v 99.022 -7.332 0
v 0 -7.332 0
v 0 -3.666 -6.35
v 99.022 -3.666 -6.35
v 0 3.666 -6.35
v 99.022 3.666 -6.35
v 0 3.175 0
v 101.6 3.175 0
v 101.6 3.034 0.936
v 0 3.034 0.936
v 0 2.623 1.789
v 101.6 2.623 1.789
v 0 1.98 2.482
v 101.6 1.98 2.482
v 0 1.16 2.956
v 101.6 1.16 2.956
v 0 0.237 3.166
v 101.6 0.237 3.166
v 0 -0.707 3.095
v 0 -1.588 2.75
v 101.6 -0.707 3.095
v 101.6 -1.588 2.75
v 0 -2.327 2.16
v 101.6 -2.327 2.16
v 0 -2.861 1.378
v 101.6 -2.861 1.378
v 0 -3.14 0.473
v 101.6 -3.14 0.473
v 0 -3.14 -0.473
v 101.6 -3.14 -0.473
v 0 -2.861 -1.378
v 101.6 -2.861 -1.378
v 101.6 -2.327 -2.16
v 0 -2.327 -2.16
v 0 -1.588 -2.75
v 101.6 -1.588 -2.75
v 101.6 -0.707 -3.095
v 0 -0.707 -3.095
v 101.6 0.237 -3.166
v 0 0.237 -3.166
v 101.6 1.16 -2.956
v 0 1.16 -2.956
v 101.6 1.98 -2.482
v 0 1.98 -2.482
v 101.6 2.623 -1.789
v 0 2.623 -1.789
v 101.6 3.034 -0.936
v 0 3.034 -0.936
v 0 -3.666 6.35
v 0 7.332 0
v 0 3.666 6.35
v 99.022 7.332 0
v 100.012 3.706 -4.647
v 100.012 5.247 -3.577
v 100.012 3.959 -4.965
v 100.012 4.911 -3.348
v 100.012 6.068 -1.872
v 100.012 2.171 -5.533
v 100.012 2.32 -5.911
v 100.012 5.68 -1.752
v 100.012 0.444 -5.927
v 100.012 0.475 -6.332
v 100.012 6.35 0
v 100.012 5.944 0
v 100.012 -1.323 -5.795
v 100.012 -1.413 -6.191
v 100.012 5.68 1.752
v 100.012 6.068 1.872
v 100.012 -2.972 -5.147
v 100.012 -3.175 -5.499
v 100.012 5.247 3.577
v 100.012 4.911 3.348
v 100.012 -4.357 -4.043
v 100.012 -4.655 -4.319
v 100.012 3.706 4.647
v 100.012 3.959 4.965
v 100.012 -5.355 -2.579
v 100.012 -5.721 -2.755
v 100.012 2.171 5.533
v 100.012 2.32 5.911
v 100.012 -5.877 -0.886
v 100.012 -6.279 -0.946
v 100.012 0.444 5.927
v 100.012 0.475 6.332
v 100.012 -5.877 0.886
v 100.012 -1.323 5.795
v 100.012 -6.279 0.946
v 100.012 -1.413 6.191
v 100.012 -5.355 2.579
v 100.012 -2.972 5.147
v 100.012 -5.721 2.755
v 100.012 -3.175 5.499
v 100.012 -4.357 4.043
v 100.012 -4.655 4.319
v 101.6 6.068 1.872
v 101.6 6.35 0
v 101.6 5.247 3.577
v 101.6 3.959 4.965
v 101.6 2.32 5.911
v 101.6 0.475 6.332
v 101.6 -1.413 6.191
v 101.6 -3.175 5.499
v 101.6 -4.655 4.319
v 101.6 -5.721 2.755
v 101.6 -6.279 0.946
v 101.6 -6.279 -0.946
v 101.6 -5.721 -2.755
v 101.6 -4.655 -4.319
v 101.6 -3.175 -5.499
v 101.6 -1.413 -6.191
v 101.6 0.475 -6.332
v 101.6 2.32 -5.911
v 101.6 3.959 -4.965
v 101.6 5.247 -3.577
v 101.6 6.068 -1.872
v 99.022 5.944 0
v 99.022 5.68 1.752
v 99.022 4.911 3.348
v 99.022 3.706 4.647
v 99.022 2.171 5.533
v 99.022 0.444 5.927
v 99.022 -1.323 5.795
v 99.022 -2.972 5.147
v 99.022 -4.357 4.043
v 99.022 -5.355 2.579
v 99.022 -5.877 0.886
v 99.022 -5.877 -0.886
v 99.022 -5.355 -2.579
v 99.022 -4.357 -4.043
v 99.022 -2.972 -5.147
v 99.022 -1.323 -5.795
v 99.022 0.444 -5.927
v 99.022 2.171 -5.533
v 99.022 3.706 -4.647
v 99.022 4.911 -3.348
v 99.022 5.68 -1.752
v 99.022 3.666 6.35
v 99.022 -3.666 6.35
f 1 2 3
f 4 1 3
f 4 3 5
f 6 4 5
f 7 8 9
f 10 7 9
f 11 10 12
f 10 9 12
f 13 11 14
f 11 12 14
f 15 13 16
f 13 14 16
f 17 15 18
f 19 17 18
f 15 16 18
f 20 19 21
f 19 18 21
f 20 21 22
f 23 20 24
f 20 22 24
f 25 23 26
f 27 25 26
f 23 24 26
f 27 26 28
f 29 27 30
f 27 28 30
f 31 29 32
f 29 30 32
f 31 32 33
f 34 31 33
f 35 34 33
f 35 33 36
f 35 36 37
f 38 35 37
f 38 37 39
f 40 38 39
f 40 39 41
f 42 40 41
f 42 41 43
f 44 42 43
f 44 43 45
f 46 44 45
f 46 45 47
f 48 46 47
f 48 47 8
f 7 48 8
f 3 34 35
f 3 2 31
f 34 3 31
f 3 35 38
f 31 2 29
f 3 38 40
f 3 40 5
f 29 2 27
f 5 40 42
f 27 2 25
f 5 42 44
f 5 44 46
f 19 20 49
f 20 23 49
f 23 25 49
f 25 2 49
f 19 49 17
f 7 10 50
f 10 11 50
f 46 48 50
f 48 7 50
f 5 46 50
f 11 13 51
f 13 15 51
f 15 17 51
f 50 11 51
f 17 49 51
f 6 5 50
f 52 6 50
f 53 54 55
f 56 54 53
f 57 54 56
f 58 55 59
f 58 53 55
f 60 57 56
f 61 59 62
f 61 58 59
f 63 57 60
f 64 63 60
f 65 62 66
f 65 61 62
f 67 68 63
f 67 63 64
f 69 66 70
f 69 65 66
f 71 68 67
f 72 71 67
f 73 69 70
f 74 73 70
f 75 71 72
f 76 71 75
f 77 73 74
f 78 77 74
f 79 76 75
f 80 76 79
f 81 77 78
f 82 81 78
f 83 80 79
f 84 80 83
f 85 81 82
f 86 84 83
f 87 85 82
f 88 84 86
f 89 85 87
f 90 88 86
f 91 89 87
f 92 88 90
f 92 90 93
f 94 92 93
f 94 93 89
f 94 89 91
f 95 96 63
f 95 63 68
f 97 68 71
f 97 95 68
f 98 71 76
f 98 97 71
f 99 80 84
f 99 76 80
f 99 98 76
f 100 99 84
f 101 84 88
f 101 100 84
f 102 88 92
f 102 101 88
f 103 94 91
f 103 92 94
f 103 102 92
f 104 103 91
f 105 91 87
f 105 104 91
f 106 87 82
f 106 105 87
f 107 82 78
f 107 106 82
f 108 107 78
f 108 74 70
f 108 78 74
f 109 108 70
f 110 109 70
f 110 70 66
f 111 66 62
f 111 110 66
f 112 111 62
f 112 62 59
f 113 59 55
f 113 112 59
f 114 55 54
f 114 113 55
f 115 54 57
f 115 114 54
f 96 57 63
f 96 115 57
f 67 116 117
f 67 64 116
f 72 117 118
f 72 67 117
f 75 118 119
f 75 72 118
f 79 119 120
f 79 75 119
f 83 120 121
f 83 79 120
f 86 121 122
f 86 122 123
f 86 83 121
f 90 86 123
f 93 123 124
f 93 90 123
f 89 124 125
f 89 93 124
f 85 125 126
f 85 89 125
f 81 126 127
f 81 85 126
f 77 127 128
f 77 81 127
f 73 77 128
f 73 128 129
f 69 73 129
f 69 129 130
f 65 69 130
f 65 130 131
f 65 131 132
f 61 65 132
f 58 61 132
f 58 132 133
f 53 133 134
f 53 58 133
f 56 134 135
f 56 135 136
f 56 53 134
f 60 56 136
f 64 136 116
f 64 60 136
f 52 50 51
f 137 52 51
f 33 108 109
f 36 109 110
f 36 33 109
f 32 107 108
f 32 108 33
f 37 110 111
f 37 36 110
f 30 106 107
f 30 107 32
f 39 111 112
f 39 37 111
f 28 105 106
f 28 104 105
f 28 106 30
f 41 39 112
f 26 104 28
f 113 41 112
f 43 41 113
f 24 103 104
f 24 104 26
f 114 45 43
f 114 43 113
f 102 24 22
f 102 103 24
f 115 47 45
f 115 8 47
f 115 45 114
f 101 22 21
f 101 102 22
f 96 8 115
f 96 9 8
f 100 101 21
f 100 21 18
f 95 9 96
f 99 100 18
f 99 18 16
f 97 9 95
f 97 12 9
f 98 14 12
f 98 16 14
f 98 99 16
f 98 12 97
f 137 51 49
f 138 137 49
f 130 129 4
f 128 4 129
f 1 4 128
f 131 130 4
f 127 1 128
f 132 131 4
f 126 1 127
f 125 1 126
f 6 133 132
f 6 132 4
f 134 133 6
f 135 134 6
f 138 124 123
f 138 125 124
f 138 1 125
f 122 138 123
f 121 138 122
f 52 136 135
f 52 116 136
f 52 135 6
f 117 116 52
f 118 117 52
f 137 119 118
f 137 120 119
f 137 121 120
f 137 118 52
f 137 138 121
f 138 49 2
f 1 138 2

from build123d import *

# Parameters (mm, degrees)
F1_DEPTH = 101.6
F4_R     = 3.175
F5_DEPTH = 101.601


with BuildPart() as f1:
    # F0 (on Right) → F1 (new body)
    with BuildSketch(Plane.YZ):
        Polygon((3.6661742094, 6.35), (-3.6661742094, 6.35), (-7.3323484187, 0), (-3.6661742094, -6.35), (3.6661742094, -6.35), (7.3323484187, 0), align=None)
    extrude(amount=F1_DEPTH)

    # F2 (on Top) → F3 (revolve, cut)
    with BuildSketch(Plane.XY):
        Polygon((100.0125, 6.35), (101.6, 6.35), (101.6, 7.3323484187), (99.0219, 7.3323484187), (99.0219, 5.9436), (100.0125, 5.9436), align=None)
    revolve(axis=Axis((50.8, 0, 0), (1, 0, 0)), mode=Mode.SUBTRACT)

    # F4 (on face) → F5 (cut, through all)
    with BuildSketch(Plane.YZ.offset(101.6)):
        Circle(F4_R)
    extrude(amount=-F5_DEPTH, mode=Mode.SUBTRACT)


solid = f1.part
